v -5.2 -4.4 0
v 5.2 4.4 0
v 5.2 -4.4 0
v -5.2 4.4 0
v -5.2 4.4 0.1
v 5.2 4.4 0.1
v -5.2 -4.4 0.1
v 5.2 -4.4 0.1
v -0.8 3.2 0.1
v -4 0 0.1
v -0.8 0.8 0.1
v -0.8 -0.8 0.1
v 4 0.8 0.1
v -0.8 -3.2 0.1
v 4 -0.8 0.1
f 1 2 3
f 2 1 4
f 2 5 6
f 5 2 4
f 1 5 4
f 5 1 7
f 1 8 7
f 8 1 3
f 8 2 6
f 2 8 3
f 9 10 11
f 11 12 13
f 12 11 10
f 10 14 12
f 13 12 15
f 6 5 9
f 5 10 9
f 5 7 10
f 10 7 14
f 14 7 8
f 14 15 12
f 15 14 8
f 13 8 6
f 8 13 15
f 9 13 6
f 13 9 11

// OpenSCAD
// file: ../p/4-4edge.scad
use <../lib.scad>
$fa=1; $fs=0.2;
function ldraw_lib__4_4edge(realsolid=false) = [
// 0 Circle 1.0
// 0 Name: 4-4edge.dat
// 0 Author: James Jessiman
// 0 !LDRAW_ORG Primitive UPDATE 2017-01
// 0 !LICENSE Licensed under CC BY 2.0 and CC BY 4.0 : see CAreadme.txt
// 
// 0 BFC CERTIFY CCW
  [0,"BFC","CERTIFY"],
  [0,"BFC","CCW"],
// 
// 0 !HISTORY 1998-12-15 [PTadmin] Official Update 1998-10
// 0 !HISTORY 2005-12-28 [PTadmin] Official Update 2005-01
// 0 !HISTORY 2007-06-24 [PTadmin] Header formatted for Contributor Agreement
// 0 !HISTORY 2008-07-01 [PTadmin] Official Update 2008-01
// 0 !HISTORY 2017-01-15 [Steffen] BFCed
// 0 !HISTORY 2017-12-30 [PTadmin] Official Update 2017-01
// 
// 
// 2 24 1 0 0 0.9239 0 0.3827
  [2,24,1,0,0,0.9239,0,0.3827],
// 2 24 0.9239 0 0.3827 0.7071 0 0.7071
  [2,24,0.9239,0,0.3827,0.7071,0,0.7071],
// 2 24 0.7071 0 0.7071 0.3827 0 0.9239
  [2,24,0.7071,0,0.7071,0.3827,0,0.9239],
// 2 24 0.3827 0 0.9239 0 0 1
  [2,24,0.3827,0,0.9239,0,0,1],
// 2 24 0 0 1 -0.3827 0 0.9239
  [2,24,0,0,1,-0.3827,0,0.9239],
// 2 24 -0.3827 0 0.9239 -0.7071 0 0.7071
  [2,24,-0.3827,0,0.9239,-0.7071,0,0.7071],
// 2 24 -0.7071 0 0.7071 -0.9239 0 0.3827
  [2,24,-0.7071,0,0.7071,-0.9239,0,0.3827],
// 2 24 -0.9239 0 0.3827 -1 0 -0
  [2,24,-0.9239,0,0.3827,-1,0,-0],
// 2 24 -1 0 -0 -0.9239 0 -0.3827
  [2,24,-1,0,-0,-0.9239,0,-0.3827],
// 2 24 -0.9239 0 -0.3827 -0.7071 0 -0.7071
  [2,24,-0.9239,0,-0.3827,-0.7071,0,-0.7071],
// 2 24 -0.7071 0 -0.7071 -0.3827 0 -0.9239
  [2,24,-0.7071,0,-0.7071,-0.3827,0,-0.9239],
// 2 24 -0.3827 0 -0.9239 0 0 -1
  [2,24,-0.3827,0,-0.9239,0,0,-1],
// 2 24 0 0 -1 0.3827 0 -0.9239
  [2,24,0,0,-1,0.3827,0,-0.9239],
// 2 24 0.3827 0 -0.9239 0.7071 0 -0.7071
  [2,24,0.3827,0,-0.9239,0.7071,0,-0.7071],
// 2 24 0.7071 0 -0.7071 0.9239 0 -0.3827
  [2,24,0.7071,0,-0.7071,0.9239,0,-0.3827],
// 2 24 0.9239 0 -0.3827 1 0 0
  [2,24,0.9239,0,-0.3827,1,0,0],
];
module ldraw_lib__4_4edge(step=0, col=false, unit=2/5, alt=false, line=0.2, solid=!$preview)
    makepoly(ldraw_lib__4_4edge(solid), step=step, col=col, unit=unit, alt=alt, line=line, solid=solid);
ldraw_lib__4_4edge(line=0.2);
// file: ../p/4-4disc.scad
use <../lib.scad>
$fa=1; $fs=0.2;
function ldraw_lib__4_4disc(realsolid=false) = [
// 0 Disc 1.0
// 0 Name: 4-4disc.dat
// 0 Author: James Jessiman
// 0 !LDRAW_ORG Primitive UPDATE 2002-02
// 0 !LICENSE Licensed under CC BY 2.0 and CC BY 4.0 : see CAreadme.txt
// 
// 0 BFC CERTIFY CCW
  [0,"BFC","CERTIFY"],
  [0,"BFC","CCW"],
// 
// 0 !HISTORY 1998-12-15 [PTadmin] Official Update 1998-10
// 0 !HISTORY 2002-03-23 [sbliss] Added BFC statement
// 0 !HISTORY 2002-04-25 [PTadmin] Official Update 2002-02
// 0 !HISTORY 2007-06-24 [PTadmin] Header formatted for Contributor Agreement
// 0 !HISTORY 2008-07-01 [PTadmin] Official Update 2008-01
// 
// 
// 3 16 0 0 0 1 0 0 0.9239 0 0.3827
  [3,16,0,0,0,1,0,0,0.9239,0,0.3827],
// 3 16 0 0 0 0.9239 0 0.3827 0.7071 0 0.7071
  [3,16,0,0,0,0.9239,0,0.3827,0.7071,0,0.7071],
// 3 16 0 0 0 0.7071 0 0.7071 0.3827 0 0.9239
  [3,16,0,0,0,0.7071,0,0.7071,0.3827,0,0.9239],
// 3 16 0 0 0 0.3827 0 0.9239 0 0 1
  [3,16,0,0,0,0.3827,0,0.9239,0,0,1],
// 3 16 0 0 0 0 0 1 -0.3827 0 0.9239
  [3,16,0,0,0,0,0,1,-0.3827,0,0.9239],
// 3 16 0 0 0 -0.3827 0 0.9239 -0.7071 0 0.7071
  [3,16,0,0,0,-0.3827,0,0.9239,-0.7071,0,0.7071],
// 3 16 0 0 0 -0.7071 0 0.7071 -0.9239 0 0.3827
  [3,16,0,0,0,-0.7071,0,0.7071,-0.9239,0,0.3827],
// 3 16 0 0 0 -0.9239 0 0.3827 -1 0 -0
  [3,16,0,0,0,-0.9239,0,0.3827,-1,0,-0],
// 3 16 0 0 0 -1 0 -0 -0.9239 0 -0.3827
  [3,16,0,0,0,-1,0,-0,-0.9239,0,-0.3827],
// 3 16 0 0 0 -0.9239 0 -0.3827 -0.7071 0 -0.7071
  [3,16,0,0,0,-0.9239,0,-0.3827,-0.7071,0,-0.7071],
// 3 16 0 0 0 -0.7071 0 -0.7071 -0.3827 0 -0.9239
  [3,16,0,0,0,-0.7071,0,-0.7071,-0.3827,0,-0.9239],
// 3 16 0 0 0 -0.3827 0 -0.9239 0 0 -1
  [3,16,0,0,0,-0.3827,0,-0.9239,0,0,-1],
// 3 16 0 0 0 0 0 -1 0.3827 0 -0.9239
  [3,16,0,0,0,0,0,-1,0.3827,0,-0.9239],
// 3 16 0 0 0 0.3827 0 -0.9239 0.7071 0 -0.7071
  [3,16,0,0,0,0.3827,0,-0.9239,0.7071,0,-0.7071],
// 3 16 0 0 0 0.7071 0 -0.7071 0.9239 0 -0.3827
  [3,16,0,0,0,0.7071,0,-0.7071,0.9239,0,-0.3827],
// 3 16 0 0 0 0.9239 0 -0.3827 1 0 0
  [3,16,0,0,0,0.9239,0,-0.3827,1,0,0],
// 0
];
module ldraw_lib__4_4disc(step=0, col=false, unit=2/5, alt=false, line=0.2, solid=!$preview)
    makepoly(ldraw_lib__4_4disc(solid), step=step, col=col, unit=unit, alt=alt, line=line, solid=solid);
ldraw_lib__4_4disc(line=0.2);
// file: ../p/4-4cyli.scad
use <../lib.scad>
$fa=1; $fs=0.2;
function ldraw_lib__4_4cyli(realsolid=false) = [
// 0 Cylinder 1.0
// 0 Name: 4-4cyli.dat
// 0 Author: James Jessiman
// 0 !LDRAW_ORG Primitive UPDATE 2005-01
// 0 !LICENSE Licensed under CC BY 2.0 and CC BY 4.0 : see CAreadme.txt
// 
// 0 BFC CERTIFY CCW
  [0,"BFC","CERTIFY"],
  [0,"BFC","CCW"],
// 
// 0 !HISTORY 1998-12-15 [PTadmin] Official Update 1998-10
// 0 !HISTORY 2002-03-23 [sbliss] Added BFC statement; merged headers from files in distributions LDraw 0.27 and Complete.
// 0 !HISTORY 2002-04-25 [PTadmin] Official Update 2002-02
// 0 !HISTORY 2004-12-14 [guyvivan] BFC CCW
// 0 !HISTORY 2005-12-28 [PTadmin] Official Update 2005-01
// 0 !HISTORY 2007-06-24 [PTadmin] Header formatted for Contributor Agreement
// 0 !HISTORY 2008-07-01 [PTadmin] Official Update 2008-01
// 
// 
// 4 16 1 1 0 0.9239 1 0.3827 0.9239 0 0.3827 1 0 0
  [4,16,1,1,0,0.9239,1,0.3827,0.9239,0,0.3827,1,0,0],
// 5 24 1 0 0 1 1 0 0.9239 0 0.3827 0.9239 0 -0.3827
  [5,24,1,0,0,1,1,0,0.9239,0,0.3827,0.9239,0,-0.3827],
// 4 16 0.9239 1 0.3827 0.7071 1 0.7071 0.7071 0 0.7071 0.9239 0 0.3827
  [4,16,0.9239,1,0.3827,0.7071,1,0.7071,0.7071,0,0.7071,0.9239,0,0.3827],
// 5 24 0.9239 0 0.3827 0.9239 1 0.3827 0.7071 0 0.7071 1 0 0
  [5,24,0.9239,0,0.3827,0.9239,1,0.3827,0.7071,0,0.7071,1,0,0],
// 4 16 0.7071 1 0.7071 0.3827 1 0.9239 0.3827 0 0.9239 0.7071 0 0.7071
  [4,16,0.7071,1,0.7071,0.3827,1,0.9239,0.3827,0,0.9239,0.7071,0,0.7071],
// 5 24 0.7071 0 0.7071 0.7071 1 0.7071 0.3827 0 0.9239 0.9239 0 0.3827
  [5,24,0.7071,0,0.7071,0.7071,1,0.7071,0.3827,0,0.9239,0.9239,0,0.3827],
// 4 16 0.3827 1 0.9239 0 1 1 0 0 1 0.3827 0 0.9239
  [4,16,0.3827,1,0.9239,0,1,1,0,0,1,0.3827,0,0.9239],
// 5 24 0.3827 0 0.9239 0.3827 1 0.9239 0 0 1 0.7071 0 0.7071
  [5,24,0.3827,0,0.9239,0.3827,1,0.9239,0,0,1,0.7071,0,0.7071],
// 4 16 0 1 1 -0.3827 1 0.9239 -0.3827 0 0.9239 0 0 1
  [4,16,0,1,1,-0.3827,1,0.9239,-0.3827,0,0.9239,0,0,1],
// 5 24 0 0 1 0 1 1 -0.3827 0 0.9239 0.3827 0 0.9239
  [5,24,0,0,1,0,1,1,-0.3827,0,0.9239,0.3827,0,0.9239],
// 4 16 -0.3827 1 0.9239 -0.7071 1 0.7071 -0.7071 0 0.7071 -0.3827 0 0.9239
  [4,16,-0.3827,1,0.9239,-0.7071,1,0.7071,-0.7071,0,0.7071,-0.3827,0,0.9239],
// 5 24 -0.3827 0 0.9239 -0.3827 1 0.9239 -0.7071 0 0.7071 0 0 1
  [5,24,-0.3827,0,0.9239,-0.3827,1,0.9239,-0.7071,0,0.7071,0,0,1],
// 4 16 -0.7071 1 0.7071 -0.9239 1 0.3827 -0.9239 0 0.3827 -0.7071 0 0.7071
  [4,16,-0.7071,1,0.7071,-0.9239,1,0.3827,-0.9239,0,0.3827,-0.7071,0,0.7071],
// 5 24 -0.7071 0 0.7071 -0.7071 1 0.7071 -0.9239 0 0.3827 -0.3827 0 0.9239
  [5,24,-0.7071,0,0.7071,-0.7071,1,0.7071,-0.9239,0,0.3827,-0.3827,0,0.9239],
// 4 16 -0.9239 1 0.3827 -1 1 0 -1 0 0 -0.9239 0 0.3827
  [4,16,-0.9239,1,0.3827,-1,1,0,-1,0,0,-0.9239,0,0.3827],
// 5 24 -0.9239 0 0.3827 -0.9239 1 0.3827 -1 0 0 -0.7071 0 0.7071
  [5,24,-0.9239,0,0.3827,-0.9239,1,0.3827,-1,0,0,-0.7071,0,0.7071],
// 4 16 -1 1 0 -0.9239 1 -0.3827 -0.9239 0 -0.3827 -1 0 0
  [4,16,-1,1,0,-0.9239,1,-0.3827,-0.9239,0,-0.3827,-1,0,0],
// 5 24 -1 0 0 -1 1 0 -0.9239 0 -0.3827 -0.9239 0 0.3827
  [5,24,-1,0,0,-1,1,0,-0.9239,0,-0.3827,-0.9239,0,0.3827],
// 4 16 -0.9239 1 -0.3827 -0.7071 1 -0.7071 -0.7071 0 -0.7071 -0.9239 0 -0.3827
  [4,16,-0.9239,1,-0.3827,-0.7071,1,-0.7071,-0.7071,0,-0.7071,-0.9239,0,-0.3827],
// 5 24 -0.9239 0 -0.3827 -0.9239 1 -0.3827 -0.7071 0 -0.7071 -1 0 0
  [5,24,-0.9239,0,-0.3827,-0.9239,1,-0.3827,-0.7071,0,-0.7071,-1,0,0],
// 4 16 -0.7071 1 -0.7071 -0.3827 1 -0.9239 -0.3827 0 -0.9239 -0.7071 0 -0.7071
  [4,16,-0.7071,1,-0.7071,-0.3827,1,-0.9239,-0.3827,0,-0.9239,-0.7071,0,-0.7071],
// 5 24 -0.7071 0 -0.7071 -0.7071 1 -0.7071 -0.3827 0 -0.9239 -0.9239 0 -0.3827
  [5,24,-0.7071,0,-0.7071,-0.7071,1,-0.7071,-0.3827,0,-0.9239,-0.9239,0,-0.3827],
// 4 16 -0.3827 1 -0.9239 0 1 -1 0 0 -1 -0.3827 0 -0.9239
  [4,16,-0.3827,1,-0.9239,0,1,-1,0,0,-1,-0.3827,0,-0.9239],
// 5 24 -0.3827 0 -0.9239 -0.3827 1 -0.9239 0 0 -1 -0.7071 0 -0.7071
  [5,24,-0.3827,0,-0.9239,-0.3827,1,-0.9239,0,0,-1,-0.7071,0,-0.7071],
// 4 16 0 1 -1 0.3827 1 -0.9239 0.3827 0 -0.9239 0 0 -1
  [4,16,0,1,-1,0.3827,1,-0.9239,0.3827,0,-0.9239,0,0,-1],
// 5 24 0 0 -1 0 1 -1 0.3827 0 -0.9239 -0.3827 0 -0.9239
  [5,24,0,0,-1,0,1,-1,0.3827,0,-0.9239,-0.3827,0,-0.9239],
// 4 16 0.3827 1 -0.9239 0.7071 1 -0.7071 0.7071 0 -0.7071 0.3827 0 -0.9239
  [4,16,0.3827,1,-0.9239,0.7071,1,-0.7071,0.7071,0,-0.7071,0.3827,0,-0.9239],
// 5 24 0.3827 0 -0.9239 0.3827 1 -0.9239 0.7071 0 -0.7071 0 0 -1
  [5,24,0.3827,0,-0.9239,0.3827,1,-0.9239,0.7071,0,-0.7071,0,0,-1],
// 4 16 0.7071 1 -0.7071 0.9239 1 -0.3827 0.9239 0 -0.3827 0.7071 0 -0.7071
  [4,16,0.7071,1,-0.7071,0.9239,1,-0.3827,0.9239,0,-0.3827,0.7071,0,-0.7071],
// 5 24 0.7071 0 -0.7071 0.7071 1 -0.7071 0.9239 0 -0.3827 0.3827 0 -0.9239
  [5,24,0.7071,0,-0.7071,0.7071,1,-0.7071,0.9239,0,-0.3827,0.3827,0,-0.9239],
// 4 16 0.9239 1 -0.3827 1 1 0 1 0 0 0.9239 0 -0.3827
  [4,16,0.9239,1,-0.3827,1,1,0,1,0,0,0.9239,0,-0.3827],
// 5 24 0.9239 0 -0.3827 0.9239 1 -0.3827 1 0 0 0.7071 0 -0.7071
  [5,24,0.9239,0,-0.3827,0.9239,1,-0.3827,1,0,0,0.7071,0,-0.7071],
// 0
];
module ldraw_lib__4_4cyli(step=0, col=false, unit=2/5, alt=false, line=0.2, solid=!$preview)
    makepoly(ldraw_lib__4_4cyli(solid), step=step, col=col, unit=unit, alt=alt, line=line, solid=solid);
ldraw_lib__4_4cyli(line=0.2);
// file: ../p/stud3.scad
use <../lib.scad>
use <4-4cyli.scad>
use <4-4disc.scad>
use <4-4edge.scad>
$fa=1; $fs=0.2;
function ldraw_lib__stud3(realsolid=false) = realsolid ? 
    [openscad(translate([0,0,-eps()], o=cylinder(4+eps(), r=4)),2)] : [
// 0 Stud Tube Solid
// 0 Name: stud3.dat
// 0 Author: James Jessiman
// 0 !LDRAW_ORG Primitive UPDATE 2012-01
// 0 !LICENSE Licensed under CC BY 2.0 and CC BY 4.0 : see CAreadme.txt
// 
// 0 BFC CERTIFY CCW
  [0,"BFC","CERTIFY"],
  [0,"BFC","CCW"],
// 
// 0 !HISTORY 2002-04-04 [sbliss] Modified for BFC compliance
// 0 !HISTORY 2002-04-25 [PTadmin] Official Update 2002-02
// 0 !HISTORY 2007-06-24 [PTadmin] Header formatted for Contributor Agreement
// 0 !HISTORY 2008-07-01 [PTadmin] Official Update 2008-01
// 0 !HISTORY 2012-02-16 [Philo] Changed to CCW
// 0 !HISTORY 2012-03-30 [PTadmin] Official Update 2012-01
// 
// 
// 1 16 0 -4 0 4 0 0 0 1 0 0 0 4 4-4edge.dat
  [1,16,0,-4,0,4,0,0,0,1,0,0,0,4, ldraw_lib__4_4edge(realsolid)],
// 1 16 0 0 0 4 0 0 0 1 0 0 0 4 4-4edge.dat
  [1,16,0,0,0,4,0,0,0,1,0,0,0,4, ldraw_lib__4_4edge(realsolid)],
// 1 16 0 -4 0 4 0 0 0 1 0 0 0 4 4-4disc.dat
  [1,16,0,-4,0,4,0,0,0,1,0,0,0,4, ldraw_lib__4_4disc(realsolid)],
// 1 16 0 -4 0 4 0 0 0 4 0 0 0 4 4-4cyli.dat
  [1,16,0,-4,0,4,0,0,0,4,0,0,0,4, ldraw_lib__4_4cyli(realsolid)],
];
module ldraw_lib__stud3(step=0, col=false, unit=2/5, alt=false, line=0.2, solid=!$preview)
    makepoly(ldraw_lib__stud3(solid), step=step, col=col, unit=unit, alt=alt, line=line, solid=solid);
ldraw_lib__stud3(line=0.2);
// file: ../p/stud.scad
use <../lib.scad>
use <4-4cyli.scad>
use <4-4disc.scad>
use <4-4edge.scad>
$fa=1; $fs=0.2;
function ldraw_lib__stud(realsolid=false) = realsolid ? 
    [openscad(translate([0,0,-eps()], o=cylinder(4+eps(), r=6)),2)] : [
// 0 Stud
// 0 Name: stud.dat
// 0 Author: James Jessiman
// 0 !LDRAW_ORG Primitive UPDATE 2012-01
// 0 !LICENSE Licensed under CC BY 2.0 and CC BY 4.0 : see CAreadme.txt
// 
// 0 BFC CERTIFY CCW
  [0,"BFC","CERTIFY"],
  [0,"BFC","CCW"],
// 
// 0 !HISTORY 2002-04-04 [sbliss] Modified for BFC compliance
// 0 !HISTORY 2002-04-25 [PTadmin] Official Update 2002-02
// 0 !HISTORY 2007-06-24 [PTadmin] Header formatted for Contributor Agreement
// 0 !HISTORY 2008-07-01 [PTadmin] Official Update 2008-01
// 0 !HISTORY 2012-02-16 [Philo] Changed to CCW
// 0 !HISTORY 2012-03-30 [PTadmin] Official Update 2012-01
// 
// 
// 1 16 0 0 0 6 0 0 0 1 0 0 0 6 4-4edge.dat
  [1,16,0,0,0,6,0,0,0,1,0,0,0,6, ldraw_lib__4_4edge(realsolid)],
// 1 16 0 -4 0 6 0 0 0 1 0 0 0 6 4-4edge.dat
  [1,16,0,-4,0,6,0,0,0,1,0,0,0,6, ldraw_lib__4_4edge(realsolid)],
// 1 16 0 0 0 6 0 0 0 -4 0 0 0 6 4-4cyli.dat
  [1,16,0,0,0,6,0,0,0,-4,0,0,0,6, ldraw_lib__4_4cyli(realsolid)],
// 1 16 0 -4 0 6 0 0 0 1 0 0 0 6 4-4disc.dat
  [1,16,0,-4,0,6,0,0,0,1,0,0,0,6, ldraw_lib__4_4disc(realsolid)],
];
module ldraw_lib__stud(step=0, col=false, unit=2/5, alt=false, line=0.2, solid=!$preview)
    makepoly(ldraw_lib__stud(solid), step=step, col=col, unit=unit, alt=alt, line=line, solid=solid);
ldraw_lib__stud(line=0.2);
// file: ../p/box5.scad
use <../lib.scad>
$fa=1; $fs=0.2;
function ldraw_lib__box5(realsolid=false) = [
// 0 Box with 5 Faces and All Edges
// 0 Name: box5.dat
// 0 Author: James Jessiman
// 0 !LDRAW_ORG Primitive UPDATE 2012-01
// 0 !LICENSE Licensed under CC BY 2.0 and CC BY 4.0 : see CAreadme.txt
// 
// 0 BFC CERTIFY CCW
  [0,"BFC","CERTIFY"],
  [0,"BFC","CCW"],
// 
// 0 !HISTORY 2002-04-03 [sbliss] Modified for BFC compliance
// 0 !HISTORY 2002-04-25 [PTadmin] Official Update 2002-02
// 0 !HISTORY 2007-06-24 [PTadmin] Header formatted for Contributor Agreement
// 0 !HISTORY 2008-07-01 [PTadmin] Official Update 2008-01
// 0 !HISTORY 2012-02-16 [Philo] Changed to CCW
// 0 !HISTORY 2012-03-30 [PTadmin] Official Update 2012-01
// 
// 
// 2 24 1 1 1 -1 1 1
  [2,24,1,1,1,-1,1,1],
// 2 24 -1 1 1 -1 1 -1
  [2,24,-1,1,1,-1,1,-1],
// 2 24 -1 1 -1 1 1 -1
  [2,24,-1,1,-1,1,1,-1],
// 2 24 1 1 -1 1 1 1
  [2,24,1,1,-1,1,1,1],
// 2 24 1 0 1 -1 0 1
  [2,24,1,0,1,-1,0,1],
// 2 24 -1 0 1 -1 0 -1
  [2,24,-1,0,1,-1,0,-1],
// 2 24 -1 0 -1 1 0 -1
  [2,24,-1,0,-1,1,0,-1],
// 2 24 1 0 -1 1 0 1
  [2,24,1,0,-1,1,0,1],
// 2 24 1 0 1 1 1 1
  [2,24,1,0,1,1,1,1],
// 2 24 -1 0 1 -1 1 1
  [2,24,-1,0,1,-1,1,1],
// 2 24 1 0 -1 1 1 -1
  [2,24,1,0,-1,1,1,-1],
// 2 24 -1 0 -1 -1 1 -1
  [2,24,-1,0,-1,-1,1,-1],
// 4 16 -1 1 1 1 1 1 1 1 -1 -1 1 -1
  [4,16,-1,1,1,1,1,1,1,1,-1,-1,1,-1],
// 4 16 -1 1 1 -1 0 1 1 0 1 1 1 1
  [4,16,-1,1,1,-1,0,1,1,0,1,1,1,1],
// 4 16 -1 1 -1 -1 0 -1 -1 0 1 -1 1 1
  [4,16,-1,1,-1,-1,0,-1,-1,0,1,-1,1,1],
// 4 16 1 1 -1 1 0 -1 -1 0 -1 -1 1 -1
  [4,16,1,1,-1,1,0,-1,-1,0,-1,-1,1,-1],
// 4 16 1 1 1 1 0 1 1 0 -1 1 1 -1
  [4,16,1,1,1,1,0,1,1,0,-1,1,1,-1],
];
module ldraw_lib__box5(step=0, col=false, unit=2/5, alt=false, line=0.2, solid=!$preview)
    makepoly(ldraw_lib__box5(solid), step=step, col=col, unit=unit, alt=alt, line=line, solid=solid);
ldraw_lib__box5(line=0.2);
// file: ../p/box4t.scad
use <../lib.scad>
$fa=1; $fs=0.2;
function ldraw_lib__box4t(realsolid=false) = [
// 0 Box with 4 Adjacent Faces and All Edges
// 0 Name: box4t.dat
// 0 Author: Tore Eriksson [Tore_Eriksson]
// 0 !LDRAW_ORG Primitive UPDATE 2003-02
// 0 !LICENSE Licensed under CC BY 2.0 and CC BY 4.0 : see CAreadme.txt
// 
// 0 BFC CERTIFY CCW
  [0,"BFC","CERTIFY"],
  [0,"BFC","CCW"],
// 
// 0 !HISTORY 1997-09-29 [PTadmin] Official Update 1997-15
// 0 !HISTORY 2002-08-31 [izanette] Modified with WINDZ for BFC compliance
// 0 !HISTORY 2003-08-01 [PTadmin] Official Update 2003-02
// 0 !HISTORY 2007-06-24 [PTadmin] Header formatted for Contributor Agreement
// 0 !HISTORY 2008-07-01 [PTadmin] Official Update 2008-01
// 
// 
// 2 24 1 1 1 -1 1 1
  [2,24,1,1,1,-1,1,1],
// 2 24 -1 1 1 -1 1 -1
  [2,24,-1,1,1,-1,1,-1],
// 2 24 -1 1 -1 1 1 -1
  [2,24,-1,1,-1,1,1,-1],
// 2 24 1 1 -1 1 1 1
  [2,24,1,1,-1,1,1,1],
// 2 24 1 0 1 -1 0 1
  [2,24,1,0,1,-1,0,1],
// 2 24 -1 0 1 -1 0 -1
  [2,24,-1,0,1,-1,0,-1],
// 2 24 -1 0 -1 1 0 -1
  [2,24,-1,0,-1,1,0,-1],
// 2 24 1 0 -1 1 0 1
  [2,24,1,0,-1,1,0,1],
// 2 24 1 0 1 1 1 1
  [2,24,1,0,1,1,1,1],
// 2 24 -1 0 1 -1 1 1
  [2,24,-1,0,1,-1,1,1],
// 2 24 1 0 -1 1 1 -1
  [2,24,1,0,-1,1,1,-1],
// 2 24 -1 0 -1 -1 1 -1
  [2,24,-1,0,-1,-1,1,-1],
// 4 16 1 1 1 1 1 -1 -1 1 -1 -1 1 1
  [4,16,1,1,1,1,1,-1,-1,1,-1,-1,1,1],
// 4 16 1 1 1 -1 1 1 -1 0 1 1 0 1
  [4,16,1,1,1,-1,1,1,-1,0,1,1,0,1],
// 4 16 -1 1 1 -1 1 -1 -1 0 -1 -1 0 1
  [4,16,-1,1,1,-1,1,-1,-1,0,-1,-1,0,1],
// 0 4 16 -1 1 -1 -1 0 -1 1 0 -1 1 1 -1
// 4 16 1 1 -1 1 1 1 1 0 1 1 0 -1
  [4,16,1,1,-1,1,1,1,1,0,1,1,0,-1],
// 0
];
module ldraw_lib__box4t(step=0, col=false, unit=2/5, alt=false, line=0.2, solid=!$preview)
    makepoly(ldraw_lib__box4t(solid), step=step, col=col, unit=unit, alt=alt, line=line, solid=solid);
ldraw_lib__box4t(line=0.2);
// file: s/3004s01.scad
use <../../lib.scad>
use <../../p/box4t.scad>
use <../../p/box5.scad>
use <../../p/stud.scad>
use <../../p/stud3.scad>
$fa=1; $fs=0.2;
function ldraw_lib__s__3004s01(realsolid=false) = [
// 0 ~Brick  1 x  2 without Front Face
// 0 Name: s\3004s01.dat
// 0 Author: James Jessiman
// 0 !LDRAW_ORG Subpart UPDATE 2003-03
// 0 !LICENSE Licensed under CC BY 2.0 and CC BY 4.0 : see CAreadme.txt
// 
// 0 BFC CERTIFY CCW
  [0,"BFC","CERTIFY"],
  [0,"BFC","CCW"],
// 
// 0 !HISTORY 2003-09-07 [jriley] Subfiling, BFC
// 0 !HISTORY 2003-12-19 [PTadmin] Official Update 2003-03
// 0 !HISTORY 2007-08-29 [PTadmin] Header formatted for Contributor Agreement
// 0 !HISTORY 2008-07-01 [PTadmin] Official Update 2008-01
// 
// 
// 1 16 0 4 0 1 0 0 0 -5 0 0 0 1 stud3.dat
  [1,16,0,4,0,1,0,0,0,-5,0,0,0,1, ldraw_lib__stud3(realsolid)],
// 0 BFC INVERTNEXT
  [0,"BFC","INVERTNEXT"],
// 1 16 0 24 0 16 0 0 0 -20 0 0 0 6 box5.dat
  [1,16,0,24,0,16,0,0,0,-20,0,0,0,6, ldraw_lib__box5(realsolid)],
// 4 16 20 24 10 16 24 6 -16 24 6 -20 24 10
  [4,16,20,24,10,16,24,6,-16,24,6,-20,24,10],
// 4 16 -20 24 10 -16 24 6 -16 24 -6 -20 24 -10
  [4,16,-20,24,10,-16,24,6,-16,24,-6,-20,24,-10],
// 4 16 -20 24 -10 -16 24 -6 16 24 -6 20 24 -10
  [4,16,-20,24,-10,-16,24,-6,16,24,-6,20,24,-10],
// 4 16 20 24 -10 16 24 -6 16 24 6 20 24 10
  [4,16,20,24,-10,16,24,-6,16,24,6,20,24,10],
// 1 16 0 24 0 20 0 0 0 -24 0 0 0 10 box4t.dat
  [1,16,0,24,0,20,0,0,0,-24,0,0,0,10, ldraw_lib__box4t(realsolid)],
// 1 16 10 0 0 1 0 0 0 1 0 0 0 1 stud.dat
  [1,16,10,0,0,1,0,0,0,1,0,0,0,1, ldraw_lib__stud(realsolid)],
// 1 16 -10 0 0 1 0 0 0 1 0 0 0 1 stud.dat
  [1,16,-10,0,0,1,0,0,0,1,0,0,0,1, ldraw_lib__stud(realsolid)],
// 0
];
module ldraw_lib__s__3004s01(step=0, col=false, unit=2/5, alt=false, line=0.2, solid=!$preview)
    makepoly(ldraw_lib__s__3004s01(solid), step=step, col=col, unit=unit, alt=alt, line=line, solid=solid);
ldraw_lib__s__3004s01(line=0.2);
// file: 3004.scad
use <../lib.scad>
use <s/3004s01.scad>
$fa=1; $fs=0.2;
function ldraw_lib__3004(realsolid=false) = [
// 0 Brick  1 x  2
// 0 Name: 3004.dat
// 0 Author: James Jessiman
// 0 !LDRAW_ORG Part UPDATE 2022-05
// 0 !LICENSE Licensed under CC BY 2.0 and CC BY 4.0 : see CAreadme.txt
// 
// 0 BFC CERTIFY CCW
  [0,"BFC","CERTIFY"],
  [0,"BFC","CCW"],
// 
// 0 !HISTORY 2001-10-26 [PTadmin] Official Update 2001-01
// 0 !HISTORY 2002-05-07 {unknown} BFC Certification
// 0 !HISTORY 2002-06-11 [PTadmin] Official Update 2002-03
// 0 !HISTORY 2007-05-07 [PTadmin] Header formatted for Contributor Agreement
// 0 !HISTORY 2008-07-01 [PTadmin] Official Update 2008-01
// 0 !HISTORY 2022-08-04 [MagFors] Using subfile
// 0 !HISTORY 2022-09-15 [PTadmin] Official Update 2022-05
// 
// 
// 1 16 0 0 0 1 0 0 0 1 0 0 0 1 s\3004s01.dat
  [1,16,0,0,0,1,0,0,0,1,0,0,0,1, ldraw_lib__s__3004s01(realsolid)],
// 4 16 -20 24 -10 20 24 -10 20 0 -10 -20 0 -10
  [4,16,-20,24,-10,20,24,-10,20,0,-10,-20,0,-10],
];
module ldraw_lib__3004(step=0, col=false, unit=2/5, alt=false, line=0.2, solid=!$preview)
    makepoly(ldraw_lib__3004(solid), step=step, col=col, unit=unit, alt=alt, line=line, solid=solid);
ldraw_lib__3004(line=0.2);
// file: ../p/box5-12.scad
use <../lib.scad>
$fa=1; $fs=0.2;
function ldraw_lib__box5_12(realsolid=false) = [
// 0 Box with 5 Faces without Any Edges
// 0 Name: box5-12.dat
// 0 Author: Chris Dee [cwdee]
// 0 !LDRAW_ORG Primitive UPDATE 2009-02
// 0 !LICENSE Licensed under CC BY 2.0 and CC BY 4.0 : see CAreadme.txt
// 
// 0 BFC CERTIFY CCW
  [0,"BFC","CERTIFY"],
  [0,"BFC","CCW"],
// 
// 0 !HISTORY 2009-09-03 [PTadmin] Official Update 2009-02
// 
// 
// 4 16 1 1 1 1 1 -1 -1 1 -1 -1 1 1
  [4,16,1,1,1,1,1,-1,-1,1,-1,-1,1,1],
// 4 16 -1 0 1 1 0 1 1 1 1 -1 1 1
  [4,16,-1,0,1,1,0,1,1,1,1,-1,1,1],
// 4 16 -1 0 -1 -1 0 1 -1 1 1 -1 1 -1
  [4,16,-1,0,-1,-1,0,1,-1,1,1,-1,1,-1],
// 4 16 1 0 -1 -1 0 -1 -1 1 -1 1 1 -1
  [4,16,1,0,-1,-1,0,-1,-1,1,-1,1,1,-1],
// 4 16 1 0 1 1 0 -1 1 1 -1 1 1 1
  [4,16,1,0,1,1,0,-1,1,1,-1,1,1,1],
// 0
];
module ldraw_lib__box5_12(step=0, col=false, unit=2/5, alt=false, line=0.2, solid=!$preview)
    makepoly(ldraw_lib__box5_12(solid), step=step, col=col, unit=unit, alt=alt, line=line, solid=solid);
ldraw_lib__box5_12(line=0.2);
// main file
use <../lib.scad>
use <../p/box5-12.scad>
$fa=1; $fs=0.2;
function ldraw_lib__190295b(realsolid=false) = [
// 0 Sticker  1.1 x  1.3 with Black Left Arrow
// 0 Name: 190295b.dat
// 0 Author: Takeshi Takahashi [RainbowDolphin]
// 0 !LDRAW_ORG Part UPDATE 2022-01
// 0 !LICENSE Licensed under CC BY 2.0 and CC BY 4.0 : see CAreadme.txt
// 
// 0 BFC CERTIFY CCW
  [0,"BFC","CERTIFY"],
  [0,"BFC","CCW"],
// 
// 0 !KEYWORDS bus station, Set 379-1
// 
// 0 !HISTORY 2022-01-14 [PTadmin] Official Update 2022-01
// 
// 
// 1 16 0 -0.25 0 13 0 0 0 0.25 0 0 0 11 box5-12.dat
  [1,16,0,-0.25,0,13,0,0,0,0.25,0,0,0,11, ldraw_lib__box5_12(realsolid)],
// 3 0 -2 -0.25 8 -10 -0.25 0 -2 -0.25 2
  [3,0,-2,-0.25,8,-10,-0.25,0,-2,-0.25,2],
// 4 0 -2 -0.25 2 -10 -0.25 0 -2 -0.25 -2 10 -0.25 2
  [4,0,-2,-0.25,2,-10,-0.25,0,-2,-0.25,-2,10,-0.25,2],
// 3 0 -10 -0.25 0 -2 -0.25 -8 -2 -0.25 -2
  [3,0,-10,-0.25,0,-2,-0.25,-8,-2,-0.25,-2],
// 3 0 10 -0.25 2 -2 -0.25 -2 10 -0.25 -2
  [3,0,10,-0.25,2,-2,-0.25,-2,10,-0.25,-2],
// 3 15 13 -0.25 11 -13 -0.25 11 -2 -0.25 8
  [3,15,13,-0.25,11,-13,-0.25,11,-2,-0.25,8],
// 3 15 -13 -0.25 11 -10 -0.25 0 -2 -0.25 8
  [3,15,-13,-0.25,11,-10,-0.25,0,-2,-0.25,8],
// 3 15 -13 -0.25 11 -13 -0.25 -11 -10 -0.25 0
  [3,15,-13,-0.25,11,-13,-0.25,-11,-10,-0.25,0],
// 3 15 -10 -0.25 0 -13 -0.25 -11 -2 -0.25 -8
  [3,15,-10,-0.25,0,-13,-0.25,-11,-2,-0.25,-8],
// 3 15 -2 -0.25 -8 -13 -0.25 -11 13 -0.25 -11
  [3,15,-2,-0.25,-8,-13,-0.25,-11,13,-0.25,-11],
// 4 15 -2 -0.25 -8 13 -0.25 -11 10 -0.25 -2 -2 -0.25 -2
  [4,15,-2,-0.25,-8,13,-0.25,-11,10,-0.25,-2,-2,-0.25,-2],
// 4 15 10 -0.25 2 10 -0.25 -2 13 -0.25 -11 13 -0.25 11
  [4,15,10,-0.25,2,10,-0.25,-2,13,-0.25,-11,13,-0.25,11],
// 4 15 10 -0.25 2 13 -0.25 11 -2 -0.25 8 -2 -0.25 2
  [4,15,10,-0.25,2,13,-0.25,11,-2,-0.25,8,-2,-0.25,2],
];
module ldraw_lib__190295b(step=0, col=false, unit=2/5, alt=false, line=0.2, solid=!$preview)
    makepoly(ldraw_lib__190295b(solid), step=step, col=col, unit=unit, alt=alt, line=line, solid=solid);
ldraw_lib__190295b(line=0.2);
